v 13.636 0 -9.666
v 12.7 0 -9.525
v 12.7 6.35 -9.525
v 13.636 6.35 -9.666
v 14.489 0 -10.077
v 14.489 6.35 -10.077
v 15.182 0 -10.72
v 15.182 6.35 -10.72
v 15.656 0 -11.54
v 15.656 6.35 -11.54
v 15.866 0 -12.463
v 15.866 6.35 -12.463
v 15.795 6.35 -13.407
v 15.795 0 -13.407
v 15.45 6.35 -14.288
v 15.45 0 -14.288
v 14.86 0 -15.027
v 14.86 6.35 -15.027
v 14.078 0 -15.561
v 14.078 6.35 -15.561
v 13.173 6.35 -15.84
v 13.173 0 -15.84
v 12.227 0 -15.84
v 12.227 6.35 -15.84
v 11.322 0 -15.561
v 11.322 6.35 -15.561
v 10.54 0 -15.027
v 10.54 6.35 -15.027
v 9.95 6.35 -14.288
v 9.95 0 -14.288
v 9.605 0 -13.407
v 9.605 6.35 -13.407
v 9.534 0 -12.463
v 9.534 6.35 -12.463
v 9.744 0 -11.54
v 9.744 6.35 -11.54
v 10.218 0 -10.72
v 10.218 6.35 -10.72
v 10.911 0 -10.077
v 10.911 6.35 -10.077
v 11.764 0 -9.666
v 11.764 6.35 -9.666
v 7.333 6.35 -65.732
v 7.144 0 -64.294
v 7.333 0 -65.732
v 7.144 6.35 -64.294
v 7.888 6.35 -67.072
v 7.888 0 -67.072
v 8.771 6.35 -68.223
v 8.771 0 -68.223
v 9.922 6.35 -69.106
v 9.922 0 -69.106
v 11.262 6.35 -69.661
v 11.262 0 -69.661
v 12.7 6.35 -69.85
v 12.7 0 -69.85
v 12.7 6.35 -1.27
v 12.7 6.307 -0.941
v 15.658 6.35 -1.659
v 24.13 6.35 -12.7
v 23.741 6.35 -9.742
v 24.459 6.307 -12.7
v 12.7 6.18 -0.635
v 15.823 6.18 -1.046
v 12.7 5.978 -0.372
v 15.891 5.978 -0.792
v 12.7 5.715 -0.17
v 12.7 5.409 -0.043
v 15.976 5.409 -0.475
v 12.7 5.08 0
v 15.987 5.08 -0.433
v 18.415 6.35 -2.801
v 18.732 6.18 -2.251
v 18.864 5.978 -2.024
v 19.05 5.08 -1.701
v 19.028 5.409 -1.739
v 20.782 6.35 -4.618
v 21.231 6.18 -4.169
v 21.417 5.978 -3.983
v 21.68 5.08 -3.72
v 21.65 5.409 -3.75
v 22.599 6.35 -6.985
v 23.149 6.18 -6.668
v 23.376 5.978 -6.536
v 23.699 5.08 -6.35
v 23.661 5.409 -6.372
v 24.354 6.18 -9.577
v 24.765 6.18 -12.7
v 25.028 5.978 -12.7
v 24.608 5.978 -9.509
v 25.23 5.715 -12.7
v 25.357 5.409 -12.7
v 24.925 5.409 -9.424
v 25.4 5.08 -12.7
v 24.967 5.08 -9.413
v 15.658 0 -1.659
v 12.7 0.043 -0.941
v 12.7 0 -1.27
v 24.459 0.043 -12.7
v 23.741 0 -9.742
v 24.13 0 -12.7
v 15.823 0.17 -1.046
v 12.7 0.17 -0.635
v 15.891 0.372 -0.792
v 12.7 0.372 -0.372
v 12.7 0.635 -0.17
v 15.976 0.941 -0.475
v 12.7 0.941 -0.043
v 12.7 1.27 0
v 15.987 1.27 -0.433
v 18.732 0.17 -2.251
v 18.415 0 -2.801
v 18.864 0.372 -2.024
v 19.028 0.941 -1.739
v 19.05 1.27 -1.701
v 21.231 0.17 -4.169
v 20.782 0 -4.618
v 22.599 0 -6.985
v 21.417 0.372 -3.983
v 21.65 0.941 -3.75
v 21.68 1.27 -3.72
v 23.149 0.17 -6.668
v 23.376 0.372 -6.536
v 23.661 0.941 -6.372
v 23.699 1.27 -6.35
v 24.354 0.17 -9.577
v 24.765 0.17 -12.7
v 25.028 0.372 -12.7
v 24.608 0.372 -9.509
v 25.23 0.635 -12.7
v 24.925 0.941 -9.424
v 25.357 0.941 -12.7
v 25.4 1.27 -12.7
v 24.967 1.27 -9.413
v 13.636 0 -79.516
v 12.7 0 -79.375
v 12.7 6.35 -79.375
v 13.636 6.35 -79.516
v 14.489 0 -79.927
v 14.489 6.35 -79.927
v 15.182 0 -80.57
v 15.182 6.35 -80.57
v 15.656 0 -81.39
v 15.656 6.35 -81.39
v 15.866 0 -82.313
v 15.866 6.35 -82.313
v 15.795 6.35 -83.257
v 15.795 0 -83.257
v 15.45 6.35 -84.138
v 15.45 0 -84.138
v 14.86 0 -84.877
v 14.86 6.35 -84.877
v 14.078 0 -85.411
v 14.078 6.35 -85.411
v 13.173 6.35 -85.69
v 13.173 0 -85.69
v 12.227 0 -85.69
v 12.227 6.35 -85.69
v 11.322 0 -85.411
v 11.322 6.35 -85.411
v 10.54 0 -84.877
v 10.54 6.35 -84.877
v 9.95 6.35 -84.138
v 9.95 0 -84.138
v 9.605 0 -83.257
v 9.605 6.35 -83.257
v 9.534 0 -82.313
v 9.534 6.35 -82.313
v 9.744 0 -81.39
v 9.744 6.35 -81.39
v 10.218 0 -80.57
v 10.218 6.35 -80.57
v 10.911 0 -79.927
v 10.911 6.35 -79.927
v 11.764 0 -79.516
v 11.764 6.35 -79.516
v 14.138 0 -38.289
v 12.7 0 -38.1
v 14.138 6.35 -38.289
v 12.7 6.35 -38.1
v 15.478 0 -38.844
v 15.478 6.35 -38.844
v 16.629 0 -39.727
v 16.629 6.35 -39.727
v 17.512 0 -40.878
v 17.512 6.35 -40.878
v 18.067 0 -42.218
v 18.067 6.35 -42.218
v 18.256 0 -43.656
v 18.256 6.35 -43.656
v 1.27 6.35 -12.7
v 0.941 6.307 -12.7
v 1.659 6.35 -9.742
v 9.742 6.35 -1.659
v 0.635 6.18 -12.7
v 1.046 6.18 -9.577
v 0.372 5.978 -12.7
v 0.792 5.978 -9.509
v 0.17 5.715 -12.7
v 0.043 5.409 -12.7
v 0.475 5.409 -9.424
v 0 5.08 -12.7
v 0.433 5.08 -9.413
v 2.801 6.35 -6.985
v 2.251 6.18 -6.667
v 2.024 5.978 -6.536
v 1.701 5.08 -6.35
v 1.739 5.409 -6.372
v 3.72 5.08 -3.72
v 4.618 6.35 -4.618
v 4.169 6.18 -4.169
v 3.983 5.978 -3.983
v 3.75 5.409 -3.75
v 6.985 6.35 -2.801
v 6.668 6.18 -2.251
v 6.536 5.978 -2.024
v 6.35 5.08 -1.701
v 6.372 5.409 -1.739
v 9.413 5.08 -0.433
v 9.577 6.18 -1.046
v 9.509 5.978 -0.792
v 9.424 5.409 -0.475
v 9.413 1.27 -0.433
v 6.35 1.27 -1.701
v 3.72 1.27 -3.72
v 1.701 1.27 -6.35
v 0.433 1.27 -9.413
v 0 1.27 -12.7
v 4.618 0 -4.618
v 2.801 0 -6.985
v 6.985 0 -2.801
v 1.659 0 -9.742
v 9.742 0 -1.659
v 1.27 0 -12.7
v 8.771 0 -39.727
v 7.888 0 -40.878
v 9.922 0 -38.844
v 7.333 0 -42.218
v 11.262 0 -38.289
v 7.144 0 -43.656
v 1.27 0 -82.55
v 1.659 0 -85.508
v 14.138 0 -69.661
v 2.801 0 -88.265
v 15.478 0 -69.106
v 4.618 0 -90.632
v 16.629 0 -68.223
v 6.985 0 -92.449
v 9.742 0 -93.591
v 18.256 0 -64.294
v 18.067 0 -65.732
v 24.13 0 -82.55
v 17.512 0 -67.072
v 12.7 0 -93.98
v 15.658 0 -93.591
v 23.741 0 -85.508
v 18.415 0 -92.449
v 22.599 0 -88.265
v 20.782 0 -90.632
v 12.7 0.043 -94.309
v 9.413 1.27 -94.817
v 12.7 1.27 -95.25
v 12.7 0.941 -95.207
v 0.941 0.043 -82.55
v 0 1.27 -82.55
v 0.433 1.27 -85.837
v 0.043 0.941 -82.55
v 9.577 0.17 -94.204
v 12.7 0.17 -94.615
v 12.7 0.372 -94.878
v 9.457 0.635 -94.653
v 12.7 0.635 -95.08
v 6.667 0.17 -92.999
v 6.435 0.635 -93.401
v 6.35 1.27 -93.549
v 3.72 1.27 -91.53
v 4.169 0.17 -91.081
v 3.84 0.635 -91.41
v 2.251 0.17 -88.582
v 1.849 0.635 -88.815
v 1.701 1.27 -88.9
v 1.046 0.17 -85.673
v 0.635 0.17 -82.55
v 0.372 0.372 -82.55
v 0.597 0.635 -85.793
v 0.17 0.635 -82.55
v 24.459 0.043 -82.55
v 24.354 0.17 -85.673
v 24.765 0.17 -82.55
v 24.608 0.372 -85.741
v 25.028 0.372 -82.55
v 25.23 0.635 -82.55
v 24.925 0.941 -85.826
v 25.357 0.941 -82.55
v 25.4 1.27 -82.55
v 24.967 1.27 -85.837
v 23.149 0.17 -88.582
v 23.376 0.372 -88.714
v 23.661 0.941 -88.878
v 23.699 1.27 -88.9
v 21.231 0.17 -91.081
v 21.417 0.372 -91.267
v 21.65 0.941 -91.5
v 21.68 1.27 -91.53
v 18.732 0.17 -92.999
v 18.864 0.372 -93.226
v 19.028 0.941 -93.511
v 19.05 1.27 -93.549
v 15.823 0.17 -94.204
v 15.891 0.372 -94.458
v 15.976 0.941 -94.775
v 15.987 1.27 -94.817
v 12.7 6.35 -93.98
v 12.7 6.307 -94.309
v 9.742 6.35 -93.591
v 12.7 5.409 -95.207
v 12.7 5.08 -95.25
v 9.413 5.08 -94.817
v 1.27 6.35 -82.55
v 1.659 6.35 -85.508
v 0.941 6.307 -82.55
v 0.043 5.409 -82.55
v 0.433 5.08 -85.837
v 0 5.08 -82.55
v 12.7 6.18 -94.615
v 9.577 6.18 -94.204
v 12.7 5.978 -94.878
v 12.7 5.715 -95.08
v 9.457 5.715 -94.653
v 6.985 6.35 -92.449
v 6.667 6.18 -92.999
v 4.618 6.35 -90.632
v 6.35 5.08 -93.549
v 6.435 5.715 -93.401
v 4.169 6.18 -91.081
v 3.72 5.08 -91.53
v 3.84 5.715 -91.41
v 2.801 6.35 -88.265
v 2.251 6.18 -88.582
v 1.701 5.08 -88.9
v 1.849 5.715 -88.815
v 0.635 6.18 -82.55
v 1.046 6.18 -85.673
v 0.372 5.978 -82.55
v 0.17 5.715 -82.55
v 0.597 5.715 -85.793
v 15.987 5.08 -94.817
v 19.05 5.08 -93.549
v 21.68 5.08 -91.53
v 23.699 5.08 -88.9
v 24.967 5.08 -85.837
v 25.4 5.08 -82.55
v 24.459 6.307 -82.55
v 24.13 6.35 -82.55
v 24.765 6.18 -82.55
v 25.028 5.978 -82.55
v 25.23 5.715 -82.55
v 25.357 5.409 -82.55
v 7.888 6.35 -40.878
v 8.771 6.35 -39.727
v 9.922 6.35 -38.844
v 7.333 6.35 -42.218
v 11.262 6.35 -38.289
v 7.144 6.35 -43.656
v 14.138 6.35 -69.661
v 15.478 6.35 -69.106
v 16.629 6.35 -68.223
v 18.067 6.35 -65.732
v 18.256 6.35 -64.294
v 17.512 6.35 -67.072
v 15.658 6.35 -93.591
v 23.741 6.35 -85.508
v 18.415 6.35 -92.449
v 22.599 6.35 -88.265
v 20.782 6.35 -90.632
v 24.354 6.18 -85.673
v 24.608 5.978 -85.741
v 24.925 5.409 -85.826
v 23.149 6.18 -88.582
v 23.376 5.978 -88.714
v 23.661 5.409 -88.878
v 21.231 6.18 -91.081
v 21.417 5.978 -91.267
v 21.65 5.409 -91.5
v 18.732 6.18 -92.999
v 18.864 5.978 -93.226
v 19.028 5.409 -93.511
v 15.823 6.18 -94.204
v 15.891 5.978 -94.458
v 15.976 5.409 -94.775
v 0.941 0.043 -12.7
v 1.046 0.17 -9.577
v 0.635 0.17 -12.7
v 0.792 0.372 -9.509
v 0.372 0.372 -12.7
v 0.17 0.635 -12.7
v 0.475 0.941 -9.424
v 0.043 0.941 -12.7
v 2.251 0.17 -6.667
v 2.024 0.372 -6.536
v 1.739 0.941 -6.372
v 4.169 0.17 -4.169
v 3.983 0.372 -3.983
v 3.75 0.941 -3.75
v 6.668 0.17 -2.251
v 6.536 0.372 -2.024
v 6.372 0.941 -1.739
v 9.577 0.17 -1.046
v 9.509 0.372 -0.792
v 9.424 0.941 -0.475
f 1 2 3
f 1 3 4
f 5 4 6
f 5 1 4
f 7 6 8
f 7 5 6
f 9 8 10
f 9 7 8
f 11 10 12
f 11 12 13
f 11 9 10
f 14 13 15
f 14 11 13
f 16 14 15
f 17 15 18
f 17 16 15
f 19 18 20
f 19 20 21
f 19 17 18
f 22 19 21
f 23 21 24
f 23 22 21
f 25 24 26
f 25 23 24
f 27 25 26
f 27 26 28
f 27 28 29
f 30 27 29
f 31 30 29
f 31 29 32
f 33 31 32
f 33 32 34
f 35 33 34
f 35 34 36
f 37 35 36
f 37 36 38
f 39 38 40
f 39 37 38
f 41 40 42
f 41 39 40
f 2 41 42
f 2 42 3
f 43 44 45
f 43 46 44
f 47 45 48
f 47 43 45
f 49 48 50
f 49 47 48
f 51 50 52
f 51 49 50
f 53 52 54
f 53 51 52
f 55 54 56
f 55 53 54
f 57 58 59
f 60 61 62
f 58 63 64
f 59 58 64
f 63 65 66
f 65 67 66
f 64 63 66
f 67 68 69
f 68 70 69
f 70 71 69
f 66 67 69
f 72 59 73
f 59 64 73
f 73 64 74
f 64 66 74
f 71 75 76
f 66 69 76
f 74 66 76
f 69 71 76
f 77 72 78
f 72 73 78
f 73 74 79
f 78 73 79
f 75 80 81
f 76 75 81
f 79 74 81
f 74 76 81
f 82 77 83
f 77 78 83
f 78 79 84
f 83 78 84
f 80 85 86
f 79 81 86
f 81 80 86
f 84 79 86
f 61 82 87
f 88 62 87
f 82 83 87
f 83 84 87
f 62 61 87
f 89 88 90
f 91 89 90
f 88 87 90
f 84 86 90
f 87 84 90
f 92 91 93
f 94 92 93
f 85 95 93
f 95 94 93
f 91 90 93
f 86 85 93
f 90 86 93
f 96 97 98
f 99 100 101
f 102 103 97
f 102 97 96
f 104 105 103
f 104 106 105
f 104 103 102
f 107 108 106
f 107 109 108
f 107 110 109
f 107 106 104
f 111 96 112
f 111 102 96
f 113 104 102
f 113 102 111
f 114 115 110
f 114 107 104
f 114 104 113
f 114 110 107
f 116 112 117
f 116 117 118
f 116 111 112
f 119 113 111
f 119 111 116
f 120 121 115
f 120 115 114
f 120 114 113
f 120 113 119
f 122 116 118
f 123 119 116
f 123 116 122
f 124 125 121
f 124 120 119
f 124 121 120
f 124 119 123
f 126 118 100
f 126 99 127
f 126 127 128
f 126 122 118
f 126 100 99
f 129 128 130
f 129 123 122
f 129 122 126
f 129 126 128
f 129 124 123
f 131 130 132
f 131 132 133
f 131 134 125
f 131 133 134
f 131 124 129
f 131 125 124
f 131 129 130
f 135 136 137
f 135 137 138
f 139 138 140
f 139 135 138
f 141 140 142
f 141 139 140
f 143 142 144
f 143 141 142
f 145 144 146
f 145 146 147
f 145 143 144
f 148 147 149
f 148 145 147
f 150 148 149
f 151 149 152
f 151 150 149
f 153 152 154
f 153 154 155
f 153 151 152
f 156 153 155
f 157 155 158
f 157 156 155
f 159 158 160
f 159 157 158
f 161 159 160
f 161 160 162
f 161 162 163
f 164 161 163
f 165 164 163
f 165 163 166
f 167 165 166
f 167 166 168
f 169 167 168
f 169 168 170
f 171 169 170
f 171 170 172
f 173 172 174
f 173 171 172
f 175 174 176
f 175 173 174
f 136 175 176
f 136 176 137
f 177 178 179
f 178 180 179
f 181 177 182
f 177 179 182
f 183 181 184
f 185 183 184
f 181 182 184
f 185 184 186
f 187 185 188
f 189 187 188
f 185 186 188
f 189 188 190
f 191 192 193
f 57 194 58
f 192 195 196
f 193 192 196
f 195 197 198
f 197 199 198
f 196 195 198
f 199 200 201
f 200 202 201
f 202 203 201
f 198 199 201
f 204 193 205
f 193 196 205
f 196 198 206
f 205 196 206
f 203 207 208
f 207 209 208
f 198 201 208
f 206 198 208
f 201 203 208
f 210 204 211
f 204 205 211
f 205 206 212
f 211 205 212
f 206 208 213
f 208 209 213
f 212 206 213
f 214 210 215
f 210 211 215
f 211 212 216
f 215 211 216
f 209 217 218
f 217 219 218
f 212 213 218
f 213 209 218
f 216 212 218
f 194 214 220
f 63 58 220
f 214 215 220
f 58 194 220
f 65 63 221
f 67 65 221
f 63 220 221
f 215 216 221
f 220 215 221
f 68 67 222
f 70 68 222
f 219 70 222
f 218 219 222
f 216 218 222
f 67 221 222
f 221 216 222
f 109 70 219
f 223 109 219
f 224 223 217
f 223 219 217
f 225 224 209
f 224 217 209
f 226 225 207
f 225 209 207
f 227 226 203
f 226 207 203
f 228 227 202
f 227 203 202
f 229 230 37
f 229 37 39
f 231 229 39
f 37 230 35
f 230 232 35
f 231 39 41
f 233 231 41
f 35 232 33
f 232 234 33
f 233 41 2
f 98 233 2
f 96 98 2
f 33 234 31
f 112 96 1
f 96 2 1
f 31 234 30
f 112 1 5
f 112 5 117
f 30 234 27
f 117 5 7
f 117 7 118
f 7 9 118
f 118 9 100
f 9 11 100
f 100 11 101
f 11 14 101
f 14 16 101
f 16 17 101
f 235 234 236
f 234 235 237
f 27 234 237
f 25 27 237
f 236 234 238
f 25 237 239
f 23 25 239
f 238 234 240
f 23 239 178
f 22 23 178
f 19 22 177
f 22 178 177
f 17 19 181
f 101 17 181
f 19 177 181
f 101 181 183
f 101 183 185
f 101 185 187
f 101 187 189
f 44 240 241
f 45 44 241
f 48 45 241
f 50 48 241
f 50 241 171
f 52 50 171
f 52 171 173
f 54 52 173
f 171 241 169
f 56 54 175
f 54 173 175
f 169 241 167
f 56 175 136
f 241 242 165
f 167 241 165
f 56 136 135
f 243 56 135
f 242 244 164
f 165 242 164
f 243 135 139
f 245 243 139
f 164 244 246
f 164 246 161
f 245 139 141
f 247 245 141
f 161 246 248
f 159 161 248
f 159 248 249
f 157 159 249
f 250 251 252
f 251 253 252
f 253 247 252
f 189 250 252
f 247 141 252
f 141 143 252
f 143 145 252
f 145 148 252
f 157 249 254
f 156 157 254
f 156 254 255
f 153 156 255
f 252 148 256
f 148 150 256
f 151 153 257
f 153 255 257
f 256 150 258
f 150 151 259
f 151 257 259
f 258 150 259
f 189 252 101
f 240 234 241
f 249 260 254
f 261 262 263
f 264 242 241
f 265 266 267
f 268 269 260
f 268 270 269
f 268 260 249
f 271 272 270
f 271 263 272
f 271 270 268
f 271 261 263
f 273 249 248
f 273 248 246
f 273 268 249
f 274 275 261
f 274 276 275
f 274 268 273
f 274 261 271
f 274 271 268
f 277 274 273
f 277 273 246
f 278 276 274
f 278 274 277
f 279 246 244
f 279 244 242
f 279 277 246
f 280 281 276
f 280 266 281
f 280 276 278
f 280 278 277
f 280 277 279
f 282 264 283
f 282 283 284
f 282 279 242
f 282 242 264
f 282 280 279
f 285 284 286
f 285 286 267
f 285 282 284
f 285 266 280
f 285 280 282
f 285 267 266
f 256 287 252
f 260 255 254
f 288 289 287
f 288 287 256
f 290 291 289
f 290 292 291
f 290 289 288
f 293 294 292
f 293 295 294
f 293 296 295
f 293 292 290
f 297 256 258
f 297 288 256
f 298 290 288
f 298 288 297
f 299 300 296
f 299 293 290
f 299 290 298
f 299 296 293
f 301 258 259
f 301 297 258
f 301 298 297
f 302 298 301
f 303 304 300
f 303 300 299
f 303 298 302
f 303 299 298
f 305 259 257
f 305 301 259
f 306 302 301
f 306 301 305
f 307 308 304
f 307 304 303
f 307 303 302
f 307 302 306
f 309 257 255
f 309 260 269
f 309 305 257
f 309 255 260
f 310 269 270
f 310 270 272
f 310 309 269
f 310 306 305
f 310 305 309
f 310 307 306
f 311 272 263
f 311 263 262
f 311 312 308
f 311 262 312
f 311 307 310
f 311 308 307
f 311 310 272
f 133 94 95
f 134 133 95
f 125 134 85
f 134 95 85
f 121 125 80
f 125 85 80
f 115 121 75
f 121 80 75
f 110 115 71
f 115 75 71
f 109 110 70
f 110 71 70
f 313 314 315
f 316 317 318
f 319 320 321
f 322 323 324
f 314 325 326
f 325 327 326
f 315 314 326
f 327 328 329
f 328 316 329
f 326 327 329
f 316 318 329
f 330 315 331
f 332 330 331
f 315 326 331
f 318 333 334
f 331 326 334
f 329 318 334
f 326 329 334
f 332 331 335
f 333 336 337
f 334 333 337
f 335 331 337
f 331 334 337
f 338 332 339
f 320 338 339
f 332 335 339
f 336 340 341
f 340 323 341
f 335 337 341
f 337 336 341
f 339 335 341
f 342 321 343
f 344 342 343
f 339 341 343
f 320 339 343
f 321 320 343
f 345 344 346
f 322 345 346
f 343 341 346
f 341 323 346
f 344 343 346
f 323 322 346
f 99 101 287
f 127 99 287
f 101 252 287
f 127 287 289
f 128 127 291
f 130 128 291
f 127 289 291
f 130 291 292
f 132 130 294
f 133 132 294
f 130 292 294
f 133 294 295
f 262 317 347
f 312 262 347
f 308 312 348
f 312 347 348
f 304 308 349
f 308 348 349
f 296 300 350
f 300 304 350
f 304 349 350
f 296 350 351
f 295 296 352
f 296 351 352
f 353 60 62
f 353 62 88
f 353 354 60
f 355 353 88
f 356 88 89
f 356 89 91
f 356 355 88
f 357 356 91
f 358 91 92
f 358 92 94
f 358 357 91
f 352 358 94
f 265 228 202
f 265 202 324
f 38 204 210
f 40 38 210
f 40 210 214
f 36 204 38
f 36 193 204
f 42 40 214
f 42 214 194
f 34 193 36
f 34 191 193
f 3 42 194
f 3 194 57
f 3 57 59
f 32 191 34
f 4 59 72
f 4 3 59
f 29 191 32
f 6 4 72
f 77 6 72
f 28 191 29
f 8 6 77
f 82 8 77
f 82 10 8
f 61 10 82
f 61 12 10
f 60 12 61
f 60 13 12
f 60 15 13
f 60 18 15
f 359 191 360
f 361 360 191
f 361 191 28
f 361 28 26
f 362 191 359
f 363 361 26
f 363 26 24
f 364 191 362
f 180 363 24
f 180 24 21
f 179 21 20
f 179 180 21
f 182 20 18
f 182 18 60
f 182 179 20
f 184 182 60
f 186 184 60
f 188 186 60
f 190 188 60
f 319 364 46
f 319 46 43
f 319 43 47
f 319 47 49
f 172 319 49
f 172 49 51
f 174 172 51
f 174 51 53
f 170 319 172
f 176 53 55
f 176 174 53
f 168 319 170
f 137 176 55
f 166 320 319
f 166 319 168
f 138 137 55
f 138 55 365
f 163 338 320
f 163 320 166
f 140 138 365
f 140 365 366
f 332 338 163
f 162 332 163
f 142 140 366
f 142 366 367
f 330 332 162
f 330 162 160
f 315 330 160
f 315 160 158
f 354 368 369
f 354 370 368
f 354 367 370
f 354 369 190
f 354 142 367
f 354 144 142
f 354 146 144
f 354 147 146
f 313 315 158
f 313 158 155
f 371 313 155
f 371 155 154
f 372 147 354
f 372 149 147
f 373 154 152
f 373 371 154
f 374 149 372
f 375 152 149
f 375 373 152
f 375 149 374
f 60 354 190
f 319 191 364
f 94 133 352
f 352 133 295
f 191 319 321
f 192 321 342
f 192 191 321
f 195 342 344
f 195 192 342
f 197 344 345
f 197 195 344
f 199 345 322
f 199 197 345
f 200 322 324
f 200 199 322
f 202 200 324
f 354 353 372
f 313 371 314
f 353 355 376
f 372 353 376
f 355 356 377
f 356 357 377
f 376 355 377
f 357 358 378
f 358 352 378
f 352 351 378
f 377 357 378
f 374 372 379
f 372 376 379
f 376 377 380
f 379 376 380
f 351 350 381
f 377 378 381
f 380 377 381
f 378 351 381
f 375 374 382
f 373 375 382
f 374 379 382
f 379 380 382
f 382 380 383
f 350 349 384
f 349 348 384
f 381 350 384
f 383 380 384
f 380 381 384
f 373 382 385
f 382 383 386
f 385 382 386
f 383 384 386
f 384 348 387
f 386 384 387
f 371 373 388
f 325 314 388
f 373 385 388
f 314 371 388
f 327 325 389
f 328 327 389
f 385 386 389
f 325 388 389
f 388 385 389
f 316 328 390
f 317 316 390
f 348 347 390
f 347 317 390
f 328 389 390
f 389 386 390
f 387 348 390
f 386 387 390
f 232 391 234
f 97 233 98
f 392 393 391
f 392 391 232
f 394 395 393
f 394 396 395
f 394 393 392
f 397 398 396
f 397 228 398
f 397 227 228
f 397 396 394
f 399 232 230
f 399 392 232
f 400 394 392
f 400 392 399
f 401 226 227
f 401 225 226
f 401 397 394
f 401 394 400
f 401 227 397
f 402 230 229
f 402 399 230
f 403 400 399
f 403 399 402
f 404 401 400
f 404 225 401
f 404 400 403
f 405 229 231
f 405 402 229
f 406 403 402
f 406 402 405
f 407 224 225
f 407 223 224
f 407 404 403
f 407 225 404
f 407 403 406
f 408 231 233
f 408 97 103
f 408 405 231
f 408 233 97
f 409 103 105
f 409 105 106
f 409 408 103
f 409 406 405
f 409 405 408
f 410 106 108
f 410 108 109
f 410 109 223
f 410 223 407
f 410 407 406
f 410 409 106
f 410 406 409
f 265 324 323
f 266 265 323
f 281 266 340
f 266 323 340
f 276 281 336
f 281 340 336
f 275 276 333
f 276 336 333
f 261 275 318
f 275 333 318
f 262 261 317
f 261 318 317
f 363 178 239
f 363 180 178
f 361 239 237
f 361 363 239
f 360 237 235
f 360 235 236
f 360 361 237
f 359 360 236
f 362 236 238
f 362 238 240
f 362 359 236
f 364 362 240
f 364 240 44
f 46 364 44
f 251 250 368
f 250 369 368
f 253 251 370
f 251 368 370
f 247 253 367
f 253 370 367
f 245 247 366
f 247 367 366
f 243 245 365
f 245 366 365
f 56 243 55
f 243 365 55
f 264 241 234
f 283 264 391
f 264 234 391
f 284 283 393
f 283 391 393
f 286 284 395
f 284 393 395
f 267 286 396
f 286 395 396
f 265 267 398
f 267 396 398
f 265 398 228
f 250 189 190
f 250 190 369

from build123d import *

# Parameters (mm, degrees)
SKETCH1_W           = 25.4
SKETCH1_H           = 95.25
SKETCH1_R           = 3.175
SKETCH1_W_2         = 11.1125
SKETCH1_H_2         = 31.75
BOSS_EXTRUDE1_DEPTH = 6.35
CUT_EXTRUDE1_DEPTH  = 99.782817332
FILLET1_R           = 1.27
FILLET2_R           = 5.55625


with BuildPart() as part:
    # Sketch1 → Boss-Extrude1 (new body)
    with BuildSketch(Plane(origin=(0, 0, 0), x_dir=(1, 0, 0), z_dir=(0, 1, 0))):
        with Locations((12.7, 47.625)):
            Rectangle(SKETCH1_W, SKETCH1_H)
        with Locations(Location((12.7, 82.55, 0), (0, 0, 270))):
            Circle(SKETCH1_R, mode=Mode.SUBTRACT)
        with Locations(Location((12.7, 12.7, 0), (0, 0, 270))):
            Circle(SKETCH1_R, mode=Mode.SUBTRACT)
        with Locations((12.7, 53.975)):
            Rectangle(SKETCH1_W_2, SKETCH1_H_2, mode=Mode.SUBTRACT)
    extrude(amount=BOSS_EXTRUDE1_DEPTH)

    # Sketch2 → Cut-Extrude1 (cut, through all)
    with BuildSketch(Plane(origin=(0, 6.35, 0), x_dir=(1, 0, 0), z_dir=(0, 1, 0))):
        with BuildLine():
            ThreePointArc((0, 82.549999981), (3.719743872, 91.530256114), (12.7, 95.25))
            Line((12.7, 95.25), (0, 95.25))
            Line((0, 95.25), (0, 82.549999981))
        make_face()
        with BuildLine():
            ThreePointArc((12.7, 95.25), (21.680256121, 91.530256121), (25.4, 82.55))
            Line((25.4, 82.55), (25.4, 95.25))
            Line((25.4, 95.25), (12.7, 95.25))
        make_face()
        with BuildLine():
            ThreePointArc((12.7, 0), (3.719743903, 3.719743855), (0, 12.699999932))
            Line((0, 12.699999932), (0, 0))
            Line((0, 0), (12.7, 0))
        make_face()
        with BuildLine():
            Line((25.4, 0), (25.4, 12.7))
            ThreePointArc((25.4, 12.7), (21.680256121, 3.719743879), (12.7, 0))
            Line((12.7, 0), (25.4, 0))
        make_face()
    extrude(amount=-CUT_EXTRUDE1_DEPTH, mode=Mode.SUBTRACT)

    # Fillet1
    fillet1_edges = [part.edges().sort_by_distance(p)[0] for p in [
        (25.4, 0, -47.625),
        (25.4, 6.35, -47.625),
        (0, 0, -47.624999957),
        (0, 6.35, -47.624999957),
        (12.69999999, 6.35, -95.25),
        (12.69999999, 0, -95.25),
        (12.700000034, 6.35, 0),
        (12.700000034, 0, 0),
    ]]
    fillet(fillet1_edges, radius=FILLET1_R)

    # Fillet2
    fillet2_edges = [part.edges().sort_by_distance(p)[0] for p in [
        (7.14375, 3.175, -38.1),
        (18.25625, 3.175, -38.1),
        (18.25625, 3.175, -69.85),
        (7.14375, 3.175, -69.85),
    ]]
    fillet(fillet2_edges, radius=FILLET2_R - 0.0001)  # a hair under: the kernel refuses the full size


solid = part.part
